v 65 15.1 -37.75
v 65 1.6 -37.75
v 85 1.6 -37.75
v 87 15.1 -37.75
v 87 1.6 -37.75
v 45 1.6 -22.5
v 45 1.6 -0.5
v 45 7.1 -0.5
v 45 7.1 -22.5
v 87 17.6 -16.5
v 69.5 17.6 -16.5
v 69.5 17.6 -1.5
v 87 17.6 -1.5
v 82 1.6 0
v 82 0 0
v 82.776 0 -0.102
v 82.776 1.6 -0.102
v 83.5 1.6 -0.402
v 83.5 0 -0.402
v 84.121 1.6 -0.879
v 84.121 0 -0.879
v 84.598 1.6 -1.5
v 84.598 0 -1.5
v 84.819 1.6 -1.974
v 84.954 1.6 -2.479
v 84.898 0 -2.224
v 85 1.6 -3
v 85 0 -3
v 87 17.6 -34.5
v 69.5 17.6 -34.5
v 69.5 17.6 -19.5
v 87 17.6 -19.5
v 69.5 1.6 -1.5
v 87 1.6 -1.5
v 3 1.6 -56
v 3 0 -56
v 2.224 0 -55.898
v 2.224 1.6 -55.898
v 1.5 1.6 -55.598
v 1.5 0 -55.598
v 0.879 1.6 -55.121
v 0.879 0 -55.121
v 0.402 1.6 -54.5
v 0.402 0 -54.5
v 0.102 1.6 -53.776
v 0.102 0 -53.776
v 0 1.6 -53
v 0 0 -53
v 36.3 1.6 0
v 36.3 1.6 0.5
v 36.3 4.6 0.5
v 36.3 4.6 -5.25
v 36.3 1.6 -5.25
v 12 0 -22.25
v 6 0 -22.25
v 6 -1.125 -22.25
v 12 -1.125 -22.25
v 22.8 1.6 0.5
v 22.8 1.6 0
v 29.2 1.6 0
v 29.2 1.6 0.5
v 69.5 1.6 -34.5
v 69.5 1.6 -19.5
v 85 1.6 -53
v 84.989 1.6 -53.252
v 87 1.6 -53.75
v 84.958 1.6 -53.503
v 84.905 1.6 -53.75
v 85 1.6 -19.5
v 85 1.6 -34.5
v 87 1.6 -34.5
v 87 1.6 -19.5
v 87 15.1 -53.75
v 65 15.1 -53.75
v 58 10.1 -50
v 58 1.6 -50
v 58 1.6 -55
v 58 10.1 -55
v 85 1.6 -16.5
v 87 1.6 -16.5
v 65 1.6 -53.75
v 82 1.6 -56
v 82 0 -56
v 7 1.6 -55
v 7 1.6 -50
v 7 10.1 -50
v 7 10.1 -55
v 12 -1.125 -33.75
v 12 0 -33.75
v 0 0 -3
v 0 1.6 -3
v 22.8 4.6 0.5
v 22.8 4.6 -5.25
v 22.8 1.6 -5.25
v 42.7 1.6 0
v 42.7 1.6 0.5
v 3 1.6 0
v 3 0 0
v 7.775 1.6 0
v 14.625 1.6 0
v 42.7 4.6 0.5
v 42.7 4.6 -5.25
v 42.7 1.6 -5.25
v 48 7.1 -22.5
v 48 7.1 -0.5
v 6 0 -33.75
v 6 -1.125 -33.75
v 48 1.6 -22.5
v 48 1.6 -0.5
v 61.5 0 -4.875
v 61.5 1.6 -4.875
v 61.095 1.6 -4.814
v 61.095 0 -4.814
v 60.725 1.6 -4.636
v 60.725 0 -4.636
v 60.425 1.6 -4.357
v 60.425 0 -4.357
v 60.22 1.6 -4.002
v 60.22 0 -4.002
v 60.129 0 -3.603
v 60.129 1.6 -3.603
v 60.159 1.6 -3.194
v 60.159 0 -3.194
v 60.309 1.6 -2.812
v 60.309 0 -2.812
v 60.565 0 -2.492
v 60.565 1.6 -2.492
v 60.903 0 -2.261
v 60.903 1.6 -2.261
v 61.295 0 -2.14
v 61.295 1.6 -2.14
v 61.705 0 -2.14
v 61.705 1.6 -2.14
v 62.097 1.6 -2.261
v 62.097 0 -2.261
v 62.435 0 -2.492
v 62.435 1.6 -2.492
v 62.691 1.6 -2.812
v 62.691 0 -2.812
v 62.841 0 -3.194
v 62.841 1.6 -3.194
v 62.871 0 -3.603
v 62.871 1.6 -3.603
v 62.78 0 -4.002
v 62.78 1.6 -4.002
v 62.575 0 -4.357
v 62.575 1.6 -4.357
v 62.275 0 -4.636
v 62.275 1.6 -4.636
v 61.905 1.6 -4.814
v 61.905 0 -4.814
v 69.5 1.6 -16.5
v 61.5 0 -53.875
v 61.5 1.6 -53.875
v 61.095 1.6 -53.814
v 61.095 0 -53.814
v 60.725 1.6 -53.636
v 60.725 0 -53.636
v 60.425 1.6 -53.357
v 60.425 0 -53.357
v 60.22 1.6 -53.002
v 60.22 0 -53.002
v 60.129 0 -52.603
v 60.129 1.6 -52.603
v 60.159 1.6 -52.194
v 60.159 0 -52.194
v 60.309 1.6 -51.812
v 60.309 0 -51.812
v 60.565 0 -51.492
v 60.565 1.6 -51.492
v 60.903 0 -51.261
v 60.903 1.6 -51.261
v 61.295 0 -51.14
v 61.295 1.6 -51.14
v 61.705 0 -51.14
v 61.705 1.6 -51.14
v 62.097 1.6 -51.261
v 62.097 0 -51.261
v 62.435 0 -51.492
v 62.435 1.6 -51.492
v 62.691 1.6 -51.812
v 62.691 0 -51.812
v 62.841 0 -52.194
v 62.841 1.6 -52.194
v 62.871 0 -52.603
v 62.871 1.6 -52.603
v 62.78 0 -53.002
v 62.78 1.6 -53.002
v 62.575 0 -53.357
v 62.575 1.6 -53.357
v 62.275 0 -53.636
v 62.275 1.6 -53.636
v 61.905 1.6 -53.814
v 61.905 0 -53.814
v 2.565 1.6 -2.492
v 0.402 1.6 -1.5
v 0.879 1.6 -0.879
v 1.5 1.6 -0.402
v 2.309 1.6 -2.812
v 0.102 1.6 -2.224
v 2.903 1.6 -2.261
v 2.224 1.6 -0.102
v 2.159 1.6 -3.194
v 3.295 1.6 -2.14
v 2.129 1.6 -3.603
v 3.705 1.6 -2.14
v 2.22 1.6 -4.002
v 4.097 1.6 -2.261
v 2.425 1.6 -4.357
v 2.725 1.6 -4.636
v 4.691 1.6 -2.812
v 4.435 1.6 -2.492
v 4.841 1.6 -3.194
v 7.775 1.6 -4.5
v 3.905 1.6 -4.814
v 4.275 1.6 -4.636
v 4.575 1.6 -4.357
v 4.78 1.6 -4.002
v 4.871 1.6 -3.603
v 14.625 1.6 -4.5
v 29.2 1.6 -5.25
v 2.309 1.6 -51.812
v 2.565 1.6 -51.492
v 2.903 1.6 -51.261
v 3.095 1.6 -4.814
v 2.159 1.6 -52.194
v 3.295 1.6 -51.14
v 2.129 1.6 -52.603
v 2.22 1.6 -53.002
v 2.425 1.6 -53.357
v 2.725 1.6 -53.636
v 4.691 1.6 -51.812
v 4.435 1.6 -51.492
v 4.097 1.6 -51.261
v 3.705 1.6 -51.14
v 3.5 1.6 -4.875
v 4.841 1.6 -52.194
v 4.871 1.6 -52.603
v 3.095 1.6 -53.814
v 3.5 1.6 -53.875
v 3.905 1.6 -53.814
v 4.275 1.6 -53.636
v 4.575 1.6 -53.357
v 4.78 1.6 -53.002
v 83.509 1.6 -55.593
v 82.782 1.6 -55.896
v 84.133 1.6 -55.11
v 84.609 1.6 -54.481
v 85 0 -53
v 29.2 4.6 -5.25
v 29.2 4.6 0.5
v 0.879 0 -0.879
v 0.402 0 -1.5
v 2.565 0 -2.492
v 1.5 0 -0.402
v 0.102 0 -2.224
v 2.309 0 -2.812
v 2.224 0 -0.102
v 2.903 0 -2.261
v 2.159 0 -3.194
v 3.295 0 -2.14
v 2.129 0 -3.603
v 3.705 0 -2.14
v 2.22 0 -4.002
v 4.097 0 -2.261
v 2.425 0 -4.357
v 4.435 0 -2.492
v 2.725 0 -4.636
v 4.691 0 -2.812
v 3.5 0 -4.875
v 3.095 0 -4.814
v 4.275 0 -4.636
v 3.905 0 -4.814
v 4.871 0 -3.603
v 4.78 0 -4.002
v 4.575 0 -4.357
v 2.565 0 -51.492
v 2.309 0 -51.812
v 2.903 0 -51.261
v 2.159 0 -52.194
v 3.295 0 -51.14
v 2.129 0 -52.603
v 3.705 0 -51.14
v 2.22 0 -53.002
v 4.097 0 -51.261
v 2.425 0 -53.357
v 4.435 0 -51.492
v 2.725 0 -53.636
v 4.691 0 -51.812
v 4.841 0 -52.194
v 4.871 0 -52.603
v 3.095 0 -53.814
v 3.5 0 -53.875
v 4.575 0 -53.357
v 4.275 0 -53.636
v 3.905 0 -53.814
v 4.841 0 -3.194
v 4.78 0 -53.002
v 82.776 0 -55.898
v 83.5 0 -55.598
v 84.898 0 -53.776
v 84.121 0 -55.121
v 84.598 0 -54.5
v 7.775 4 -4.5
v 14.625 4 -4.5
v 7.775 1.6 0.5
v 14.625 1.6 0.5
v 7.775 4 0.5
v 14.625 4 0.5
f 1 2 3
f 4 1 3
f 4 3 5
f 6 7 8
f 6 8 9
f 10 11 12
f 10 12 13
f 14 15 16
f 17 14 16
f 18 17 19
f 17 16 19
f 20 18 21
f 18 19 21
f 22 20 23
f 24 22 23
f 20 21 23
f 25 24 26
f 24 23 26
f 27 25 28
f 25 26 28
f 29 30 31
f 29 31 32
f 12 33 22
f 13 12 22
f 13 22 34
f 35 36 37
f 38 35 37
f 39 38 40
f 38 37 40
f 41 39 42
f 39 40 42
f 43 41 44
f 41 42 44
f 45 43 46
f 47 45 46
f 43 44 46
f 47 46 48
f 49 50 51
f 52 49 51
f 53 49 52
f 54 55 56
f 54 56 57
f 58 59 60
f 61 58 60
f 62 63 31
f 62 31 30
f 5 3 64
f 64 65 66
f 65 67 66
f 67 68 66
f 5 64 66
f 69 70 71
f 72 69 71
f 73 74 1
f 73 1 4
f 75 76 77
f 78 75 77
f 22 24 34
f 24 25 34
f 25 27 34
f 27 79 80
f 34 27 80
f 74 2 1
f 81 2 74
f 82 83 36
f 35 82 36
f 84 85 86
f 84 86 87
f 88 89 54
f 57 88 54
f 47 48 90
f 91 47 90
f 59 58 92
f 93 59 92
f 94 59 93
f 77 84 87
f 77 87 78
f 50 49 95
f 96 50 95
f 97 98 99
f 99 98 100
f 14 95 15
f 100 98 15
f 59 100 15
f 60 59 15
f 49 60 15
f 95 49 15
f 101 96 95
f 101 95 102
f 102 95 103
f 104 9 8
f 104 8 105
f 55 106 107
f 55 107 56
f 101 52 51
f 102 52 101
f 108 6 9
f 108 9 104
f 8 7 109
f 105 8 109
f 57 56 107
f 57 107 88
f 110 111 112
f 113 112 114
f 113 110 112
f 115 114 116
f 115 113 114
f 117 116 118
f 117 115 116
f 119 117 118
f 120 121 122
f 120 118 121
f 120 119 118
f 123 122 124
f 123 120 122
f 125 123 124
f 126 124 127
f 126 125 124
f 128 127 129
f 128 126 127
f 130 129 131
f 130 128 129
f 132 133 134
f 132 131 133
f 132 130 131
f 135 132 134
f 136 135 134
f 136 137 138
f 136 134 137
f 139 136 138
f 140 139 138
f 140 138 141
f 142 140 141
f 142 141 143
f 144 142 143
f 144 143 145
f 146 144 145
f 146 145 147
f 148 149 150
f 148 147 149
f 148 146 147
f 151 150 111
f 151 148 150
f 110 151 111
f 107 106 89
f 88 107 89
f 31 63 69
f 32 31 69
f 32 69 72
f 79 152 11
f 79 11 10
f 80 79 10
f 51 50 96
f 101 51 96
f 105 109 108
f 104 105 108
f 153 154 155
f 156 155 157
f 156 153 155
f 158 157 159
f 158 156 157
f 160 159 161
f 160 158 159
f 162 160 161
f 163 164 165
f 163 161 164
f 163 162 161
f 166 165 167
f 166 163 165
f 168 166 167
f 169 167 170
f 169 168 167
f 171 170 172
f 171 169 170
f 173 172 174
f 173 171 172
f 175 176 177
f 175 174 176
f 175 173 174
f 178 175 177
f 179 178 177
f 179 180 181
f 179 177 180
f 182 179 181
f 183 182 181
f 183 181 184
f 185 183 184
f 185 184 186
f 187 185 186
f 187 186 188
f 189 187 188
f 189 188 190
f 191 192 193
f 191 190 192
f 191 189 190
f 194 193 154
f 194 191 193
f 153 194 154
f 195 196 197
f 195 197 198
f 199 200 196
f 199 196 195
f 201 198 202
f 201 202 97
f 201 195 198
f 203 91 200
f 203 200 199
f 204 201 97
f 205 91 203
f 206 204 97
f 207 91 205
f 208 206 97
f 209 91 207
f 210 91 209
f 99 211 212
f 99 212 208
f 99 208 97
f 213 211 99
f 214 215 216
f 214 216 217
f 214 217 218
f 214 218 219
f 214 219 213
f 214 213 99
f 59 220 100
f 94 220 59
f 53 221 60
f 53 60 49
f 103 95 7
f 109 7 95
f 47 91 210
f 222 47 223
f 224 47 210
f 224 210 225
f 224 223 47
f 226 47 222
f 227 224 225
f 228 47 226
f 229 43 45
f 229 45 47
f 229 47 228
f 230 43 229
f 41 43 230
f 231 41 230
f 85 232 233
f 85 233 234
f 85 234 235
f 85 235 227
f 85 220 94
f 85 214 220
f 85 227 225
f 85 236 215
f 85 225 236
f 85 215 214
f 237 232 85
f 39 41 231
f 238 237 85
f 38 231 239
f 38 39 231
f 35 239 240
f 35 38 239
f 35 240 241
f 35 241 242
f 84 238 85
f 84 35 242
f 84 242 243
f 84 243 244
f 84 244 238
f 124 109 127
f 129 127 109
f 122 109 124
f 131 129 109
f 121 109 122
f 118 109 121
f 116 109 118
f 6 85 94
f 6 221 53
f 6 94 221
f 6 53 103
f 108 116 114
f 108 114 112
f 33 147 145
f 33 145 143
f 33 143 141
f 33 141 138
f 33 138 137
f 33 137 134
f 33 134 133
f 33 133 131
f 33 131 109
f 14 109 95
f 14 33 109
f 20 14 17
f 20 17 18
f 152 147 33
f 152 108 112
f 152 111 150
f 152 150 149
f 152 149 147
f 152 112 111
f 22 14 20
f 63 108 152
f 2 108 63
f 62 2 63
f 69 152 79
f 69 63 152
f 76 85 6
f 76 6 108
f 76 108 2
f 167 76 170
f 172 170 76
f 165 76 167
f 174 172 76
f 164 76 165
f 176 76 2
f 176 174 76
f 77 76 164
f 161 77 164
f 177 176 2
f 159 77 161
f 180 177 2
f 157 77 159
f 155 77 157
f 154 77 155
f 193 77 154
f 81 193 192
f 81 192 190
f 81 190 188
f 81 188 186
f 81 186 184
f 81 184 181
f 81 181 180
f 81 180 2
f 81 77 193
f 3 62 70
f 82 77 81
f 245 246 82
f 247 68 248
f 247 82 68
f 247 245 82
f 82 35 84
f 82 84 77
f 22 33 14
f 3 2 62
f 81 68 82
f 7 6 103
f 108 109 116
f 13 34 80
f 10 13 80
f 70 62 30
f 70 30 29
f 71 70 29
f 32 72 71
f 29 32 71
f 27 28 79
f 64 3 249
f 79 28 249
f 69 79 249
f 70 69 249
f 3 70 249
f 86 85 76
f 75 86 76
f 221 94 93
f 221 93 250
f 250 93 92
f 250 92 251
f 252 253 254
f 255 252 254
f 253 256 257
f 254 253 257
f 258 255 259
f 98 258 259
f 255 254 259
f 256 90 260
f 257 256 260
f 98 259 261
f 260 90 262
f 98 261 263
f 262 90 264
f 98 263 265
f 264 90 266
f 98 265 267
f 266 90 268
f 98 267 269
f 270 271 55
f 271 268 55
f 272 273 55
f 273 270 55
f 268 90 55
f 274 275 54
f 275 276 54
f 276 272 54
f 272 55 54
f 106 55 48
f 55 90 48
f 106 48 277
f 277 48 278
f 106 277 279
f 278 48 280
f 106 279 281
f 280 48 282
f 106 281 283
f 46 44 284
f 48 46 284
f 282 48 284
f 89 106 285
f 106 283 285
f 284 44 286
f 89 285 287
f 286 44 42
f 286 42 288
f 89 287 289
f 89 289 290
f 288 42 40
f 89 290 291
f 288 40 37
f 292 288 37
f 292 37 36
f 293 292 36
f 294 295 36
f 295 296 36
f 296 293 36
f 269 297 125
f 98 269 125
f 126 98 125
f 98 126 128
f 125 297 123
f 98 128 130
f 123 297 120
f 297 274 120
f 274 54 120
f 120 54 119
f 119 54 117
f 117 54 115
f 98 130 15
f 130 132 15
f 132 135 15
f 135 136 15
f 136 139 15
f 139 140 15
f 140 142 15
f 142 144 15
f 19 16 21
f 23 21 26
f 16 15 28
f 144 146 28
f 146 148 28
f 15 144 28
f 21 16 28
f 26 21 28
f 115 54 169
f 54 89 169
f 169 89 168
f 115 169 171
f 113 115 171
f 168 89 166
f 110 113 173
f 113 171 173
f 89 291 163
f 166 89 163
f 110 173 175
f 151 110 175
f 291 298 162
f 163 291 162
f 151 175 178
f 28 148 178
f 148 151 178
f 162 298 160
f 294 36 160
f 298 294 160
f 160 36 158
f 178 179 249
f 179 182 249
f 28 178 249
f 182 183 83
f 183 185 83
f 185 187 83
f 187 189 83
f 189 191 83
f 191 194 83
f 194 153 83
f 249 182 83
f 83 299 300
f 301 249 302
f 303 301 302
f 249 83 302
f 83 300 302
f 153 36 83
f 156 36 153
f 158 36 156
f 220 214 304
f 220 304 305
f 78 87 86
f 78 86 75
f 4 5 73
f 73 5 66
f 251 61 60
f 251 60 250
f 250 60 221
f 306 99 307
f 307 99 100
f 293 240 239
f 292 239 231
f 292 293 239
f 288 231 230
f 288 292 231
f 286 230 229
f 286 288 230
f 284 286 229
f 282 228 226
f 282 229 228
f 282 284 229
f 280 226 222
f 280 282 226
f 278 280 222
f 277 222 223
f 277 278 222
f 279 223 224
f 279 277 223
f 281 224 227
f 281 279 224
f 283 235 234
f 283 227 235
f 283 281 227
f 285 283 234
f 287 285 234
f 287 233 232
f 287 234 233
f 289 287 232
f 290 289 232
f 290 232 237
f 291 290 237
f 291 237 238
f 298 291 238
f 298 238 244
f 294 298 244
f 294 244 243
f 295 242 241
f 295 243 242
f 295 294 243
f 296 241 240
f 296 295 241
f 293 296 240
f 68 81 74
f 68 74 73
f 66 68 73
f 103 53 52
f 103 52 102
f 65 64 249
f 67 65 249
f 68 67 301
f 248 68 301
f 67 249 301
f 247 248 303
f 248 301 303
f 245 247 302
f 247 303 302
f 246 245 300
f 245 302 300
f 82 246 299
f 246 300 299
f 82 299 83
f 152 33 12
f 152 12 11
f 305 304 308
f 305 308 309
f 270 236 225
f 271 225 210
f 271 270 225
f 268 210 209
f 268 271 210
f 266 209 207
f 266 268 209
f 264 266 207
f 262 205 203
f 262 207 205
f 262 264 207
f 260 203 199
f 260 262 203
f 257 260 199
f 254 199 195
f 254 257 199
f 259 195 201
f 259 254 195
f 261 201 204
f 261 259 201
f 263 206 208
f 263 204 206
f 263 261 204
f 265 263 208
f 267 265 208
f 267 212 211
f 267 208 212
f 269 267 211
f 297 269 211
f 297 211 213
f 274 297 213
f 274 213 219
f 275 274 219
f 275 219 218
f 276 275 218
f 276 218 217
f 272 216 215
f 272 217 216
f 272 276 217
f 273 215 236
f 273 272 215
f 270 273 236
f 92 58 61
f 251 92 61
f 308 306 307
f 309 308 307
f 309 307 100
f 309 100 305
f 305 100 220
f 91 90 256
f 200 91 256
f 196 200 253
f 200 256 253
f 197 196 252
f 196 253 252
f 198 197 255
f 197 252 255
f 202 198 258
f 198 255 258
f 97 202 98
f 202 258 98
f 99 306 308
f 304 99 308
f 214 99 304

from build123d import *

# Parameters (mm, degrees)
MAIN_BOARD_DEPTH    = 1.6
BOARD_HOLES_REACH   = 103.802
SKETCH3_R           = 1.375
MICROUSB_PWR_W      = 6.85
MICROUSB_PWR_H      = 5
USB_C_DEPTH         = 2.4
SKETCH5_W           = 6.4
SKETCH5_H           = 5.750421271
MICROHDMIS_DEPTH    = 3
SKETCH6_W           = 3
SKETCH6_H           = 22
CAMERA_PORT_DEPTH   = 5.5
SKETCH7_W           = 22
SKETCH7_H           = 16
ETHERNET_PORT_DEPTH = 13.5
SKETCH8_W           = 17.5
SKETCH8_H           = 15
USB_1_DEPTH         = 16
SKETCH9_W           = 17.5
SKETCH9_H           = 15
USB_2_DEPTH         = 16
SKETCH10_W          = 51
SKETCH10_H          = 5
GPIO_DEPTH          = 8.5
SKETCH11_W          = 6
SKETCH11_H          = 11.5
BOSS_EXTRUDE1_DEPTH = 1.125


with BuildPart() as part:
    # Sketch2 → Main Board (new body)
    with BuildSketch(Plane(origin=(0, 0, 0), x_dir=(1, 0, 0), z_dir=(0, 1, 0))):
        with BuildLine():
            Line((3, 0), (82, 0))
            ThreePointArc((82, 0), (84.121320344, 0.878679656), (85, 3))
            Line((85, 3), (85, 53))
            ThreePointArc((85, 53), (84.121320344, 55.121320344), (82, 56))
            Line((82, 56), (3, 56))
            ThreePointArc((3, 56), (0.878679656, 55.121320344), (0, 53))
            Line((0, 53), (0, 3))
            ThreePointArc((0, 3), (0.878679656, 0.878679656), (3, 0))
        make_face()
    extrude(amount=MAIN_BOARD_DEPTH)

    # Sketch3 → Board Holes (cut, up to next)
    with BuildSketch(Plane(origin=(0, 0, 0), x_dir=(1, 0, 0), z_dir=(0, 1, 0)), mode=Mode.PRIVATE) as board_holes_sk1:
        with Locations(Location((3.5, 3.5, 0), (0, 0, 90))):
            Circle(SKETCH3_R)
    board_holes_tool1 = extrude(board_holes_sk1.sketch, amount=BOARD_HOLES_REACH, mode=Mode.PRIVATE) & part.part
    # Sketch3 → Board Holes (cut, up to next)
    with BuildSketch(Plane(origin=(0, 0, 0), x_dir=(1, 0, 0), z_dir=(0, 1, 0)), mode=Mode.PRIVATE) as board_holes_sk2:
        with Locations(Location((3.5, 52.5, 0), (0, 0, 90))):
            Circle(SKETCH3_R)
    board_holes_tool2 = extrude(board_holes_sk2.sketch, amount=BOARD_HOLES_REACH, mode=Mode.PRIVATE) & part.part
    # Sketch3 → Board Holes (cut, up to next)
    with BuildSketch(Plane(origin=(0, 0, 0), x_dir=(1, 0, 0), z_dir=(0, 1, 0)), mode=Mode.PRIVATE) as board_holes_sk3:
        with Locations(Location((61.5, 52.5, 0), (0, 0, 90))):
            Circle(SKETCH3_R)
    board_holes_tool3 = extrude(board_holes_sk3.sketch, amount=BOARD_HOLES_REACH, mode=Mode.PRIVATE) & part.part
    # Sketch3 → Board Holes (cut, up to next)
    with BuildSketch(Plane(origin=(0, 0, 0), x_dir=(1, 0, 0), z_dir=(0, 1, 0)), mode=Mode.PRIVATE) as board_holes_sk4:
        with Locations(Location((61.5, 3.5, 0), (0, 0, 90))):
            Circle(SKETCH3_R)
    board_holes_tool4 = extrude(board_holes_sk4.sketch, amount=BOARD_HOLES_REACH, mode=Mode.PRIVATE) & part.part
    add(board_holes_tool1.solids().sort_by_distance((3.5, 0, -3.5))[0], mode=Mode.SUBTRACT)
    add(board_holes_tool2.solids().sort_by_distance((3.5, 0, -52.5))[0], mode=Mode.SUBTRACT)
    add(board_holes_tool3.solids().sort_by_distance((61.5, 0, -52.5))[0], mode=Mode.SUBTRACT)
    add(board_holes_tool4.solids().sort_by_distance((61.5, 0, -3.5))[0], mode=Mode.SUBTRACT)

    # MicroUSB PWR → USB C (add)
    with BuildSketch(Plane(origin=(0, 1.6, 0), x_dir=(1, 0, 0), z_dir=(0, 1, 0))):
        with Locations((11.2, 2)):
            Rectangle(MICROUSB_PWR_W, MICROUSB_PWR_H)
    extrude(amount=USB_C_DEPTH)

    # Sketch5 → MicroHDMIs (add)
    with BuildSketch(Plane(origin=(0, 1.6, 0), x_dir=(1, 0, 0), z_dir=(0, 1, 0))):
        with Locations((26, 2.375210636)):
            Rectangle(SKETCH5_W, SKETCH5_H)
        with Locations((39.5, 2.375210636)):
            Rectangle(SKETCH5_W, SKETCH5_H)
    extrude(amount=MICROHDMIS_DEPTH)

    # Sketch6 → Camera Port (add)
    with BuildSketch(Plane(origin=(0, 1.6, 0), x_dir=(1, 0, 0), z_dir=(0, 1, 0))):
        with Locations((46.5, 11.5)):
            Rectangle(SKETCH6_W, SKETCH6_H)
    extrude(amount=CAMERA_PORT_DEPTH)

    # Sketch7 → Ethernet port (add)
    with BuildSketch(Plane(origin=(0, 1.6, 0), x_dir=(1, 0, 0), z_dir=(0, 1, 0))):
        with Locations((76, 45.75)):
            Rectangle(SKETCH7_W, SKETCH7_H)
    extrude(amount=ETHERNET_PORT_DEPTH)

    # Sketch8 → USB 1 (add)
    with BuildSketch(Plane(origin=(0, 1.6, 0), x_dir=(1, 0, 0), z_dir=(0, 1, 0))):
        with Locations((78.25, 9)):
            Rectangle(SKETCH8_W, SKETCH8_H)
    extrude(amount=USB_1_DEPTH)

    # Sketch9 → USB 2 (add)
    with BuildSketch(Plane(origin=(0, 1.6, 1.6), x_dir=(1, 0, 0), z_dir=(0, 1, 0))):
        with Locations((78.25, 28.6)):
            Rectangle(SKETCH9_W, SKETCH9_H)
    extrude(amount=USB_2_DEPTH)

    # Sketch10 → GPIO (add)
    with BuildSketch(Plane(origin=(0, 1.6, 0), x_dir=(1, 0, 0), z_dir=(0, 1, 0))):
        with Locations((32.5, 52.5)):
            Rectangle(SKETCH10_W, SKETCH10_H)
    extrude(amount=GPIO_DEPTH)

    # Sketch11 → Boss-Extrude1 (add)
    with BuildSketch(Plane.XZ):
        with Locations((9, -28)):
            Rectangle(SKETCH11_W, SKETCH11_H)
    extrude(amount=BOSS_EXTRUDE1_DEPTH)


solid = part.part
